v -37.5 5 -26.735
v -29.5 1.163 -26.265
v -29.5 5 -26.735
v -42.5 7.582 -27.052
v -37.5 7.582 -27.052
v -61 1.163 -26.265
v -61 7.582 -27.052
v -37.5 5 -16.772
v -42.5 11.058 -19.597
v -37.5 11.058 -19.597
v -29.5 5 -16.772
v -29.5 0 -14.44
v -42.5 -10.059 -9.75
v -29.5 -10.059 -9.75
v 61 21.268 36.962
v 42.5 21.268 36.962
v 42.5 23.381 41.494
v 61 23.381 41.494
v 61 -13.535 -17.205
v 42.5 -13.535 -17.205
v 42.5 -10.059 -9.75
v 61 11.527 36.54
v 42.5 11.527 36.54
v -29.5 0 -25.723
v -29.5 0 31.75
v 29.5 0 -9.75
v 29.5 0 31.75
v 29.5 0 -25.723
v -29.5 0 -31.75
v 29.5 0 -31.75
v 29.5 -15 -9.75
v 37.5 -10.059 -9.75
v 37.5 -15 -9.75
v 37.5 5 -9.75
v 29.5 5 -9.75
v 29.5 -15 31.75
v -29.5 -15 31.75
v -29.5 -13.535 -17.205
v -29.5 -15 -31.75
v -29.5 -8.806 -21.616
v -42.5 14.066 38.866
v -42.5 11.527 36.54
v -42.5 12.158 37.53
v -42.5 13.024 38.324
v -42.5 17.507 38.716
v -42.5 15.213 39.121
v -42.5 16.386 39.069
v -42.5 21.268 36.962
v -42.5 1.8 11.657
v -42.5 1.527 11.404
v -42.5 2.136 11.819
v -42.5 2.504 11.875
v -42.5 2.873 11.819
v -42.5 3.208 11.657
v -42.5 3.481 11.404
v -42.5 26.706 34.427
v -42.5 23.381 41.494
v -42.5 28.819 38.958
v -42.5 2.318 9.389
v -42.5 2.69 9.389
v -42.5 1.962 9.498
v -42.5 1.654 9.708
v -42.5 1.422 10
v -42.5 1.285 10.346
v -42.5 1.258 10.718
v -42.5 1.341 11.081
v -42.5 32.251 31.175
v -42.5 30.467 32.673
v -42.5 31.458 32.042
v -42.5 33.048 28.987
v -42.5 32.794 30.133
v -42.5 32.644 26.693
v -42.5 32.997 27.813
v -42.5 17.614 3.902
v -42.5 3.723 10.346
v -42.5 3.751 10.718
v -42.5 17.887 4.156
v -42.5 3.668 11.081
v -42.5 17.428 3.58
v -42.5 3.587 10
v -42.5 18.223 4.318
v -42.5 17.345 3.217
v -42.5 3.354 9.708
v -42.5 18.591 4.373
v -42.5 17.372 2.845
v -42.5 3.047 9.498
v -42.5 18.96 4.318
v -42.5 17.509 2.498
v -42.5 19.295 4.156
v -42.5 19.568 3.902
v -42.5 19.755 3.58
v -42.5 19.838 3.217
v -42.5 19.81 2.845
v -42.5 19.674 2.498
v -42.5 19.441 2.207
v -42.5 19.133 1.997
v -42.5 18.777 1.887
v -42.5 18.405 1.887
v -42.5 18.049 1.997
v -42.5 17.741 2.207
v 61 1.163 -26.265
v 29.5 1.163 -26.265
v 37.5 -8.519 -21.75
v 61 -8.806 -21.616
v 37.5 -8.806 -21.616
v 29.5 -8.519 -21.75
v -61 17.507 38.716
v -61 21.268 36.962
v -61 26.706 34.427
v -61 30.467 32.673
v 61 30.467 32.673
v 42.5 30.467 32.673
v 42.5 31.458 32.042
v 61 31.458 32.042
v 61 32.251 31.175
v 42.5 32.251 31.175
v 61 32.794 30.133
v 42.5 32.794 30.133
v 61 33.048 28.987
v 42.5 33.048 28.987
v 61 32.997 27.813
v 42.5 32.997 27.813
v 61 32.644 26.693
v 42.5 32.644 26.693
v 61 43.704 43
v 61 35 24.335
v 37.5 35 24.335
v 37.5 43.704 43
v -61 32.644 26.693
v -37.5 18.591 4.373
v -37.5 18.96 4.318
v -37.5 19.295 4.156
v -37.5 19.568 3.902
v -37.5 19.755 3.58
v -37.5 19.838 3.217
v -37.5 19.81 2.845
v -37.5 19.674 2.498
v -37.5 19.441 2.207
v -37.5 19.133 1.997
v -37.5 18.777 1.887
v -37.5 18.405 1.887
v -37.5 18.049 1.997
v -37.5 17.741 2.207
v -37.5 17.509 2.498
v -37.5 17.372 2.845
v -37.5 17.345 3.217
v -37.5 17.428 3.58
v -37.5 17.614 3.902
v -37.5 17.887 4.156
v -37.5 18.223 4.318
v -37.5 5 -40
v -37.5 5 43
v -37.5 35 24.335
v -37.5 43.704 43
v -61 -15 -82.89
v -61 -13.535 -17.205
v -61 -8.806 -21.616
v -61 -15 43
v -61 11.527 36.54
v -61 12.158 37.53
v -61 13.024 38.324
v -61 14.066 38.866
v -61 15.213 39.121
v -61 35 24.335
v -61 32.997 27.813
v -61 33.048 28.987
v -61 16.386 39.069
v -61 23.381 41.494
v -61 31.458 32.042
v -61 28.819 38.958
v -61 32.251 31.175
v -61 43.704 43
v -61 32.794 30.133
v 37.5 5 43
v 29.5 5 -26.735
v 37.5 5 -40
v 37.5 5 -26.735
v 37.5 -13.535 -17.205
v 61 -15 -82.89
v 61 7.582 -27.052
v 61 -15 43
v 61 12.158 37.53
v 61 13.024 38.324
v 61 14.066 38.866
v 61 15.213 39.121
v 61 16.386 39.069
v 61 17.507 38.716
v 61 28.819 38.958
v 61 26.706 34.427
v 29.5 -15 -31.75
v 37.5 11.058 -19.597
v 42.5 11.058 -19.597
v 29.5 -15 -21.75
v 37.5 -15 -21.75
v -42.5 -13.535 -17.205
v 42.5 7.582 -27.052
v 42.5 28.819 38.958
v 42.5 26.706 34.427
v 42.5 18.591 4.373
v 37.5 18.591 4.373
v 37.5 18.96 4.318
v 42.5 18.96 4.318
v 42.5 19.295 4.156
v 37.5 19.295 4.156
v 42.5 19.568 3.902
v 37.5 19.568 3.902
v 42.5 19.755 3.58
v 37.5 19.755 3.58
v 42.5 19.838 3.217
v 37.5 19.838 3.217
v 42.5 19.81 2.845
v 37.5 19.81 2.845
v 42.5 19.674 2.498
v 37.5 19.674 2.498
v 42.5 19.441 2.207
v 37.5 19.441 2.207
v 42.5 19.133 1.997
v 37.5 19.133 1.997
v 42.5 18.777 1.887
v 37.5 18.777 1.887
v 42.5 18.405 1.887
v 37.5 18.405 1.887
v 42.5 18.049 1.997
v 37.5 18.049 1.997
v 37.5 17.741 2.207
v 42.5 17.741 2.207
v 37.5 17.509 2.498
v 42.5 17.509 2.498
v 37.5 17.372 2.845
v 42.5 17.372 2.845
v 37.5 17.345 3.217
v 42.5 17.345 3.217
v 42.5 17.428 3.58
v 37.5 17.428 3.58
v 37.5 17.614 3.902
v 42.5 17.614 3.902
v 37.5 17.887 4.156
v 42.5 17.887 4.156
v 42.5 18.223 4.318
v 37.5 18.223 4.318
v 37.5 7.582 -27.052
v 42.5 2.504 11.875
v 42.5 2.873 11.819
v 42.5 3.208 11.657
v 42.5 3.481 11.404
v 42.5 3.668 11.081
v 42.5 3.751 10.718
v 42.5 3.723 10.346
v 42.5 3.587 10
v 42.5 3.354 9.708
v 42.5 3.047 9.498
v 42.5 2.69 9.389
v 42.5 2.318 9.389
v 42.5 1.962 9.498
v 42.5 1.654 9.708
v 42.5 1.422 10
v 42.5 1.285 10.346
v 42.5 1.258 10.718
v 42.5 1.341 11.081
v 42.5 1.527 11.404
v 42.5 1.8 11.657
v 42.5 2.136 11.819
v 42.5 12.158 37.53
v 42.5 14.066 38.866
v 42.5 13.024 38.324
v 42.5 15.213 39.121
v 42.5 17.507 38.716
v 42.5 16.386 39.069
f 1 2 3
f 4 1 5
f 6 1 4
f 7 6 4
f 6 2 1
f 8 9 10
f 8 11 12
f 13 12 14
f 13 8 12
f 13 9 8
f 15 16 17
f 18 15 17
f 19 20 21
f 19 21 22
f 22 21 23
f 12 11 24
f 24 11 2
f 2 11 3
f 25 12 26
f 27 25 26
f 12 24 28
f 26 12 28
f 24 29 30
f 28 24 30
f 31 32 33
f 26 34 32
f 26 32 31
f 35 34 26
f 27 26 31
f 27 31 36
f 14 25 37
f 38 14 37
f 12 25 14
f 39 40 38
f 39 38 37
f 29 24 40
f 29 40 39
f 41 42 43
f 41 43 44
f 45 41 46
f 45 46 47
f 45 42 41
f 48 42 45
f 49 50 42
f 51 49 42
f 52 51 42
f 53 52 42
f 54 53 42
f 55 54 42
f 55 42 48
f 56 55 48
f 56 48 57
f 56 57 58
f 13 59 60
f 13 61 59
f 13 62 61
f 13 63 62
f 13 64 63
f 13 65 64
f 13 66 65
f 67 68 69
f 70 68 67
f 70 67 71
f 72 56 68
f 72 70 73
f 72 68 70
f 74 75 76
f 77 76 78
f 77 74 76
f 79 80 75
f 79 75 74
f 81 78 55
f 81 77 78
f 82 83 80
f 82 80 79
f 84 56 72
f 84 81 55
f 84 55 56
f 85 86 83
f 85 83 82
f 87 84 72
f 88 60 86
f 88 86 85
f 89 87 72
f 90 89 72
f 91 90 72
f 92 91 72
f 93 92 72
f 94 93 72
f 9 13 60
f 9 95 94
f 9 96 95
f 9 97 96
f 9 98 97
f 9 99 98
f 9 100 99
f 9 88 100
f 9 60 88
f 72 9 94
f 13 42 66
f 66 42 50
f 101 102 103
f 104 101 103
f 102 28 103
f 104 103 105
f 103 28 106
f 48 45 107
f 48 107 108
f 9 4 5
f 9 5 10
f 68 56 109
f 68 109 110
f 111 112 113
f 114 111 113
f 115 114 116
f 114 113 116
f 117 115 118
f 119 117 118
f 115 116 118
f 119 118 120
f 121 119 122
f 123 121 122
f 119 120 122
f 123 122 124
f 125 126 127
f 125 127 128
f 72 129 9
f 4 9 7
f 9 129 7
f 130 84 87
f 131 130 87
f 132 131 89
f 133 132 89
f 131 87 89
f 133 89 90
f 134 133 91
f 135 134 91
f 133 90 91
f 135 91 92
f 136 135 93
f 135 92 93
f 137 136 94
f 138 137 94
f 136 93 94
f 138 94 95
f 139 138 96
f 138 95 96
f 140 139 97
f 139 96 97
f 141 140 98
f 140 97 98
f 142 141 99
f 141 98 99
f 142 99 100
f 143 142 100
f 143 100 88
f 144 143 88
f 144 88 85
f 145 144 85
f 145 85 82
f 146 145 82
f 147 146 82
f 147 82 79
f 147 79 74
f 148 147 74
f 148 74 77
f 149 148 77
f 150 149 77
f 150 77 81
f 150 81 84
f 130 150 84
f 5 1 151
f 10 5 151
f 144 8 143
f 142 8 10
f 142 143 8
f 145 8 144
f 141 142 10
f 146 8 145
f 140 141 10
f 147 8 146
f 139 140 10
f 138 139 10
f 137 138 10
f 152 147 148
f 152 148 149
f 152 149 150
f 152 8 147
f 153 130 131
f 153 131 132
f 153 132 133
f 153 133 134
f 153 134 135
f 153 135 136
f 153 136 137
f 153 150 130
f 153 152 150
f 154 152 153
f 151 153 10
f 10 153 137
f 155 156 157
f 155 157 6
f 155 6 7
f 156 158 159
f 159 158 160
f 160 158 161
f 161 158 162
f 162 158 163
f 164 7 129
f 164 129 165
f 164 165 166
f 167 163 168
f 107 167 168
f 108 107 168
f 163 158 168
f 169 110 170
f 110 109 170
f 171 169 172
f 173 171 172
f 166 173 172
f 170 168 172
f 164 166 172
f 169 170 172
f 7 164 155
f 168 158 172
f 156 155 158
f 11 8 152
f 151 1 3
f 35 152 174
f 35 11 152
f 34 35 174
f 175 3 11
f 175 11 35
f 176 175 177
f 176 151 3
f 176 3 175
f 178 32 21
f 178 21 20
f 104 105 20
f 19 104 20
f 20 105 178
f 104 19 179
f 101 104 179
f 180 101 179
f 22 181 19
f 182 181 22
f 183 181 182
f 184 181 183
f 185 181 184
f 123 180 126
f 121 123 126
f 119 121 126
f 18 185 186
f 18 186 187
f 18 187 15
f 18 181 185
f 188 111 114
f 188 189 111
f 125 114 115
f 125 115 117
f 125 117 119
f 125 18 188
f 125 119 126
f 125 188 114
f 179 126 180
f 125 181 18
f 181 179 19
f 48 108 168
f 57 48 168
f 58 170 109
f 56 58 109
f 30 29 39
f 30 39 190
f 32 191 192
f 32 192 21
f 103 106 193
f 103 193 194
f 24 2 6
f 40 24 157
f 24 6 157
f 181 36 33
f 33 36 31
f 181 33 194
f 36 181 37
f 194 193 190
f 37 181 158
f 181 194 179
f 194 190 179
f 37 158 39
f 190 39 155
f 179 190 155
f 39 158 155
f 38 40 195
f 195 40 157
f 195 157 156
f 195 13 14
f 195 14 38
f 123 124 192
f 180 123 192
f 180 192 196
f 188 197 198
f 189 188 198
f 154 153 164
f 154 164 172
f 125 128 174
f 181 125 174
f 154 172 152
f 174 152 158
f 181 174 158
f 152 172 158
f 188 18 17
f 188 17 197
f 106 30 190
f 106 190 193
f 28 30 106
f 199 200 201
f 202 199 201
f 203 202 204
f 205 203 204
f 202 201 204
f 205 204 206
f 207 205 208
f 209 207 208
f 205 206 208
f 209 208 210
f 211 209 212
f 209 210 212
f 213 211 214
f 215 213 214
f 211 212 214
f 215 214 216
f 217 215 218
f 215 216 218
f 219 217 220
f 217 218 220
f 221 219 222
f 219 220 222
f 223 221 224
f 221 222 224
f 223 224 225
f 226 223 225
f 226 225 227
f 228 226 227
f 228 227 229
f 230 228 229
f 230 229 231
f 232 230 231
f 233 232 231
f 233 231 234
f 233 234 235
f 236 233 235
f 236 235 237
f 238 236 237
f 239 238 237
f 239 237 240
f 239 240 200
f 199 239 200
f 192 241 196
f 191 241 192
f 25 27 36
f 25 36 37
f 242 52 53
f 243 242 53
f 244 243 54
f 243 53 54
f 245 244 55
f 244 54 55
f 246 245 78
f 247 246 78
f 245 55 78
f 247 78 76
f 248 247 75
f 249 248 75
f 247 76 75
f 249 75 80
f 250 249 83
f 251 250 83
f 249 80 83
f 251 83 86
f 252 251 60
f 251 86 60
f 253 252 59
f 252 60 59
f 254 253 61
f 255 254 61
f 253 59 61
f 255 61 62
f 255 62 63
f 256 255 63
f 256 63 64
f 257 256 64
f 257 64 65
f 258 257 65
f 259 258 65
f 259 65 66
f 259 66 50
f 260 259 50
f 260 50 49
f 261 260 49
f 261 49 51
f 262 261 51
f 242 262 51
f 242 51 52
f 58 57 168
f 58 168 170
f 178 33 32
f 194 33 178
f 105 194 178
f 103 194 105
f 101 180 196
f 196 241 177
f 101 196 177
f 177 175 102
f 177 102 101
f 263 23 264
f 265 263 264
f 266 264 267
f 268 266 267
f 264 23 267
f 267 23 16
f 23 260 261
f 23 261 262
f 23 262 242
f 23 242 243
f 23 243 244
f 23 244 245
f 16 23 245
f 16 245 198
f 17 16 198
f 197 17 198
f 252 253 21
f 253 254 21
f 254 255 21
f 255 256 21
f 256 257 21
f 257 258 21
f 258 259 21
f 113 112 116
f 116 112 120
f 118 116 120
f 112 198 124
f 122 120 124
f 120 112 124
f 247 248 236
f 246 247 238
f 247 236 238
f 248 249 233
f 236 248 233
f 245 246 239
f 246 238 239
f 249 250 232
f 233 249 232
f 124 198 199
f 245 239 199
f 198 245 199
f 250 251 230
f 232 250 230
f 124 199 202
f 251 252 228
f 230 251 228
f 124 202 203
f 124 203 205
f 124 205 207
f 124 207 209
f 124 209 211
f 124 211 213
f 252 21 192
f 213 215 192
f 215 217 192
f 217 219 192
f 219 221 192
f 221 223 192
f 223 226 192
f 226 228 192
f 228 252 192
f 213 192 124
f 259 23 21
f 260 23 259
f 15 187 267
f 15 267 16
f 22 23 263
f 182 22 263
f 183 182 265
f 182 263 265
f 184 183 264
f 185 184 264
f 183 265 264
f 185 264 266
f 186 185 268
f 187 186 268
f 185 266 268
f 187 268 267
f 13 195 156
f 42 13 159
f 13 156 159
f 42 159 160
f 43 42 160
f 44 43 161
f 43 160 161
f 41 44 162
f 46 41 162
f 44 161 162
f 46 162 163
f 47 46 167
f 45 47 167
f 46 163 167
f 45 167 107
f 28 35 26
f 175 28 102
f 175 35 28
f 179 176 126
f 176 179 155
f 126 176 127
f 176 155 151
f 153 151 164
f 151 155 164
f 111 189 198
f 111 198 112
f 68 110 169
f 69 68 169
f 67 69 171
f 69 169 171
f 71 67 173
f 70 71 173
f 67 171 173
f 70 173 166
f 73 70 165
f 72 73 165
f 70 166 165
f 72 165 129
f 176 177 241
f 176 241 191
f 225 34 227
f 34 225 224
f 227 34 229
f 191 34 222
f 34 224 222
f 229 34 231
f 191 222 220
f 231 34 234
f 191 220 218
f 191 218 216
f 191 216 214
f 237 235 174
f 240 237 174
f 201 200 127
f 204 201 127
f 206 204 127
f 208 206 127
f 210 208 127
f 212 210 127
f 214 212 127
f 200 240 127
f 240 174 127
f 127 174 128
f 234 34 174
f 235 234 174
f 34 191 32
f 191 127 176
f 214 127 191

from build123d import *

# Parameters (mm, degrees)
SKETCH1_W           = 85
SKETCH1_H           = 80
BOSS_EXTRUDE1_DEPTH = 5
SKETCH4_W           = 5
SKETCH4_H           = 80
BOSS_EXTRUDE3_DEPTH = 30
SKETCH6_R           = 1.25
CUT_EXTRUDE3_DEPTH  = 101.249688279
SKETCH3_W           = 85
SKETCH3_H           = 80
BOSS_EXTRUDE4_DEPTH = 15
SKETCH8_W           = 8
SKETCH8_H           = 12
CUT_EXTRUDE4_DEPTH  = 69.053287944
MOVE_FACE1_BY       = 3
BOSS_EXTRUDE5_DEPTH = 18.5
BOSS_EXTRUDE6_START = -103.5
BOSS_EXTRUDE6_DEPTH = 18.5
CUT_EXTRUDE5_START  = -13
CUT_EXTRUDE5_DEPTH  = 13
CUT_EXTRUDE6_START  = -85
CUT_EXTRUDE6_DEPTH  = 13
DELETEFACE1_START   = 37.5
DELETEFACE1_DEPTH   = 23.5
DELETEFACE2_START   = -61
DELETEFACE2_DEPTH   = 23.5
DELETEFACE3_START   = -61
DELETEFACE3_DEPTH   = 122


# Read off the part's stored shape, not the designer's step: DeleteFace1, DeleteFace2, DeleteFace3
with BuildPart() as part:
    # Sketch1 → Boss-Extrude1 (new body)
    with BuildSketch(Plane(origin=(0, 0, 0), x_dir=(1, 0, 0), z_dir=(0, 1, 0))):
        Rectangle(SKETCH1_W, SKETCH1_H)
    extrude(amount=BOSS_EXTRUDE1_DEPTH)

    # Sketch4 → Boss-Extrude3 (add)
    with BuildSketch(Plane(origin=(0, 5, 0), x_dir=(1, 0, 0), z_dir=(0, 1, 0))):
        with Locations((-40, 0)):
            Rectangle(SKETCH4_W, SKETCH4_H)
        with Locations((40, 0)):
            Rectangle(SKETCH4_W, SKETCH4_H)
    extrude(amount=BOSS_EXTRUDE3_DEPTH)

    # Sketch6 → Cut-Extrude3 (cut, through all)
    with BuildSketch(Plane.ZY.offset(42.5)):
        with Locations((10.624581332, 2.504153155)):
            Circle(SKETCH6_R)
        with Locations((3.123107186, 18.591116375)):
            Circle(SKETCH6_R)
        Polygon((24.335207615, 35), (-40, 5), (-40, 35), align=None)
    extrude(amount=-CUT_EXTRUDE3_DEPTH, mode=Mode.SUBTRACT)

    # Sketch3 → Boss-Extrude4 (add)
    with BuildSketch(Plane.XZ):
        Rectangle(SKETCH3_W, SKETCH3_H)
        Polygon((29.5, -21.75), (37.5, -21.75), (37.5, -9.75), (29.5, -9.75), (29.5, 31.75), (-29.5, 31.75), (-29.5, -31.75), (29.5, -31.75), align=None, mode=Mode.SUBTRACT)
    extrude(amount=BOSS_EXTRUDE4_DEPTH)

    # Sketch8 → Cut-Extrude4 (cut, through all)
    with BuildSketch(Plane.XZ):
        with Locations((33.5, -15.75)):
            Rectangle(SKETCH8_W, SKETCH8_H)
    extrude(amount=-CUT_EXTRUDE4_DEPTH, mode=Mode.SUBTRACT)

    # Move Face1: a face moved outward by 3.0
    extrude(part.faces().sort_by_distance((0, -1.25, 40))[0], amount=MOVE_FACE1_BY, dir=(0, 0, 1))

    # Sketch7 → Boss-Extrude5 (add)
    with BuildSketch(Plane(origin=(42.5, 0, 0), x_dir=(0, 0, -1), z_dir=(1, 0, 0))):
        Polygon((40, -15), (40, 5), (-24.335207615, 35), (-43, 35), (-43, -15), align=None)
        with BuildLine():
            Line((-26.692544096, 32.64359903), (27.051507675, 7.582336108))
            Line((27.051507675, 7.582336108), (26.26502094, 1.163306695))
            Line((26.26502094, 1.163306695), (21.61622006, -8.806078963))
            Line((21.61622006, -8.806078963), (17.204502177, -13.534635329))
            Line((17.204502177, -13.534635329), (-36.539549595, 11.526627592))
            ThreePointArc((-36.539549595, 11.526627592), (-38.86638421, 14.065921988), (-38.716152458, 17.506794811))
            Line((-38.716152458, 17.506794811), (-36.962286672, 21.267972127))
            Line((-36.962286672, 21.267972127), (-41.493825607, 23.381063436))
            Line((-41.493825607, 23.381063436), (-38.958116037, 28.818910158))
            Line((-38.958116037, 28.818910158), (-34.426577102, 26.70581885))
            Line((-34.426577102, 26.70581885), (-32.672711316, 30.466996166))
            ThreePointArc((-32.672711316, 30.466996166), (-30.133416919, 32.793830782), (-26.692544096, 32.64359903))
        make_face(mode=Mode.SUBTRACT)
    extrude(amount=BOSS_EXTRUDE5_DEPTH)

    # Sketch7<2> → Boss-Extrude6 (add)
    with BuildSketch(Plane(origin=(42.5, 0, 0), x_dir=(0, 0, -1), z_dir=(1, 0, 0)).offset(BOSS_EXTRUDE6_START)):
        Polygon((40, -15), (40, 5), (-24.335207615, 35), (-43, 35), (-43, -15), align=None)
        with BuildLine():
            Line((-26.692544096, 32.64359903), (27.051507675, 7.582336108))
            Line((27.051507675, 7.582336108), (26.26502094, 1.163306695))
            Line((26.26502094, 1.163306695), (21.61622006, -8.806078963))
            Line((21.61622006, -8.806078963), (17.204502177, -13.534635329))
            Line((17.204502177, -13.534635329), (-36.539549595, 11.526627592))
            ThreePointArc((-36.539549595, 11.526627592), (-38.86638421, 14.065921988), (-38.716152458, 17.506794811))
            Line((-38.716152458, 17.506794811), (-36.962286672, 21.267972127))
            Line((-36.962286672, 21.267972127), (-41.493825607, 23.381063436))
            Line((-41.493825607, 23.381063436), (-38.958116037, 28.818910158))
            Line((-38.958116037, 28.818910158), (-34.426577102, 26.70581885))
            Line((-34.426577102, 26.70581885), (-32.672711316, 30.466996166))
            ThreePointArc((-32.672711316, 30.466996166), (-30.133416919, 32.793830782), (-26.692544096, 32.64359903))
        make_face(mode=Mode.SUBTRACT)
    extrude(amount=BOSS_EXTRUDE6_DEPTH)

    # Sketch9 → Cut-Extrude5 (cut)
    with BuildSketch(Plane(origin=(42.5, 0, 0), x_dir=(0, 0, -1), z_dir=(1, 0, 0)).offset(CUT_EXTRUDE5_START)):
        Polygon((21.61622006, -8.806078963), (26.26502094, 1.163306695), (27.051507675, 7.582336108), (19.597005499, 11.058427561), (9.75, -10.058543877), (17.204502177, -13.534635329), align=None)
    extrude(amount=CUT_EXTRUDE5_DEPTH, mode=Mode.SUBTRACT)

    # Sketch9<3> → Cut-Extrude6 (cut)
    with BuildSketch(Plane(origin=(42.5, 0, 0), x_dir=(0, 0, -1), z_dir=(1, 0, 0)).offset(CUT_EXTRUDE6_START)):
        Polygon((21.61622006, -8.806078963), (26.26502094, 1.163306695), (27.051507675, 7.582336108), (19.597005499, 11.058427561), (9.75, -10.058543877), (17.204502177, -13.534635329), align=None)
    extrude(amount=CUT_EXTRUDE6_DEPTH, mode=Mode.SUBTRACT)

    # DeleteFace1 outline → DeleteFace1 (add)
    with BuildSketch(Plane.YZ.offset(DELETEFACE1_START)):
        Polygon((43.703535627, 43), (35, 43), (35, 24.335207615), align=None)
    extrude(amount=DELETEFACE1_DEPTH)

    # DeleteFace2 outline → DeleteFace2 (add)
    with BuildSketch(Plane.YZ.offset(DELETEFACE2_START)):
        Polygon((43.703535627, 43), (35, 43), (35, 24.335207615), align=None)
    extrude(amount=DELETEFACE2_DEPTH)

    # DeleteFace3 outline → DeleteFace3 (add)
    with BuildSketch(Plane.YZ.offset(DELETEFACE3_START)):
        Polygon((-15, -82.89013841), (5, -40), (-15, -40), align=None)
    extrude(amount=DELETEFACE3_DEPTH)


solid = part.part
